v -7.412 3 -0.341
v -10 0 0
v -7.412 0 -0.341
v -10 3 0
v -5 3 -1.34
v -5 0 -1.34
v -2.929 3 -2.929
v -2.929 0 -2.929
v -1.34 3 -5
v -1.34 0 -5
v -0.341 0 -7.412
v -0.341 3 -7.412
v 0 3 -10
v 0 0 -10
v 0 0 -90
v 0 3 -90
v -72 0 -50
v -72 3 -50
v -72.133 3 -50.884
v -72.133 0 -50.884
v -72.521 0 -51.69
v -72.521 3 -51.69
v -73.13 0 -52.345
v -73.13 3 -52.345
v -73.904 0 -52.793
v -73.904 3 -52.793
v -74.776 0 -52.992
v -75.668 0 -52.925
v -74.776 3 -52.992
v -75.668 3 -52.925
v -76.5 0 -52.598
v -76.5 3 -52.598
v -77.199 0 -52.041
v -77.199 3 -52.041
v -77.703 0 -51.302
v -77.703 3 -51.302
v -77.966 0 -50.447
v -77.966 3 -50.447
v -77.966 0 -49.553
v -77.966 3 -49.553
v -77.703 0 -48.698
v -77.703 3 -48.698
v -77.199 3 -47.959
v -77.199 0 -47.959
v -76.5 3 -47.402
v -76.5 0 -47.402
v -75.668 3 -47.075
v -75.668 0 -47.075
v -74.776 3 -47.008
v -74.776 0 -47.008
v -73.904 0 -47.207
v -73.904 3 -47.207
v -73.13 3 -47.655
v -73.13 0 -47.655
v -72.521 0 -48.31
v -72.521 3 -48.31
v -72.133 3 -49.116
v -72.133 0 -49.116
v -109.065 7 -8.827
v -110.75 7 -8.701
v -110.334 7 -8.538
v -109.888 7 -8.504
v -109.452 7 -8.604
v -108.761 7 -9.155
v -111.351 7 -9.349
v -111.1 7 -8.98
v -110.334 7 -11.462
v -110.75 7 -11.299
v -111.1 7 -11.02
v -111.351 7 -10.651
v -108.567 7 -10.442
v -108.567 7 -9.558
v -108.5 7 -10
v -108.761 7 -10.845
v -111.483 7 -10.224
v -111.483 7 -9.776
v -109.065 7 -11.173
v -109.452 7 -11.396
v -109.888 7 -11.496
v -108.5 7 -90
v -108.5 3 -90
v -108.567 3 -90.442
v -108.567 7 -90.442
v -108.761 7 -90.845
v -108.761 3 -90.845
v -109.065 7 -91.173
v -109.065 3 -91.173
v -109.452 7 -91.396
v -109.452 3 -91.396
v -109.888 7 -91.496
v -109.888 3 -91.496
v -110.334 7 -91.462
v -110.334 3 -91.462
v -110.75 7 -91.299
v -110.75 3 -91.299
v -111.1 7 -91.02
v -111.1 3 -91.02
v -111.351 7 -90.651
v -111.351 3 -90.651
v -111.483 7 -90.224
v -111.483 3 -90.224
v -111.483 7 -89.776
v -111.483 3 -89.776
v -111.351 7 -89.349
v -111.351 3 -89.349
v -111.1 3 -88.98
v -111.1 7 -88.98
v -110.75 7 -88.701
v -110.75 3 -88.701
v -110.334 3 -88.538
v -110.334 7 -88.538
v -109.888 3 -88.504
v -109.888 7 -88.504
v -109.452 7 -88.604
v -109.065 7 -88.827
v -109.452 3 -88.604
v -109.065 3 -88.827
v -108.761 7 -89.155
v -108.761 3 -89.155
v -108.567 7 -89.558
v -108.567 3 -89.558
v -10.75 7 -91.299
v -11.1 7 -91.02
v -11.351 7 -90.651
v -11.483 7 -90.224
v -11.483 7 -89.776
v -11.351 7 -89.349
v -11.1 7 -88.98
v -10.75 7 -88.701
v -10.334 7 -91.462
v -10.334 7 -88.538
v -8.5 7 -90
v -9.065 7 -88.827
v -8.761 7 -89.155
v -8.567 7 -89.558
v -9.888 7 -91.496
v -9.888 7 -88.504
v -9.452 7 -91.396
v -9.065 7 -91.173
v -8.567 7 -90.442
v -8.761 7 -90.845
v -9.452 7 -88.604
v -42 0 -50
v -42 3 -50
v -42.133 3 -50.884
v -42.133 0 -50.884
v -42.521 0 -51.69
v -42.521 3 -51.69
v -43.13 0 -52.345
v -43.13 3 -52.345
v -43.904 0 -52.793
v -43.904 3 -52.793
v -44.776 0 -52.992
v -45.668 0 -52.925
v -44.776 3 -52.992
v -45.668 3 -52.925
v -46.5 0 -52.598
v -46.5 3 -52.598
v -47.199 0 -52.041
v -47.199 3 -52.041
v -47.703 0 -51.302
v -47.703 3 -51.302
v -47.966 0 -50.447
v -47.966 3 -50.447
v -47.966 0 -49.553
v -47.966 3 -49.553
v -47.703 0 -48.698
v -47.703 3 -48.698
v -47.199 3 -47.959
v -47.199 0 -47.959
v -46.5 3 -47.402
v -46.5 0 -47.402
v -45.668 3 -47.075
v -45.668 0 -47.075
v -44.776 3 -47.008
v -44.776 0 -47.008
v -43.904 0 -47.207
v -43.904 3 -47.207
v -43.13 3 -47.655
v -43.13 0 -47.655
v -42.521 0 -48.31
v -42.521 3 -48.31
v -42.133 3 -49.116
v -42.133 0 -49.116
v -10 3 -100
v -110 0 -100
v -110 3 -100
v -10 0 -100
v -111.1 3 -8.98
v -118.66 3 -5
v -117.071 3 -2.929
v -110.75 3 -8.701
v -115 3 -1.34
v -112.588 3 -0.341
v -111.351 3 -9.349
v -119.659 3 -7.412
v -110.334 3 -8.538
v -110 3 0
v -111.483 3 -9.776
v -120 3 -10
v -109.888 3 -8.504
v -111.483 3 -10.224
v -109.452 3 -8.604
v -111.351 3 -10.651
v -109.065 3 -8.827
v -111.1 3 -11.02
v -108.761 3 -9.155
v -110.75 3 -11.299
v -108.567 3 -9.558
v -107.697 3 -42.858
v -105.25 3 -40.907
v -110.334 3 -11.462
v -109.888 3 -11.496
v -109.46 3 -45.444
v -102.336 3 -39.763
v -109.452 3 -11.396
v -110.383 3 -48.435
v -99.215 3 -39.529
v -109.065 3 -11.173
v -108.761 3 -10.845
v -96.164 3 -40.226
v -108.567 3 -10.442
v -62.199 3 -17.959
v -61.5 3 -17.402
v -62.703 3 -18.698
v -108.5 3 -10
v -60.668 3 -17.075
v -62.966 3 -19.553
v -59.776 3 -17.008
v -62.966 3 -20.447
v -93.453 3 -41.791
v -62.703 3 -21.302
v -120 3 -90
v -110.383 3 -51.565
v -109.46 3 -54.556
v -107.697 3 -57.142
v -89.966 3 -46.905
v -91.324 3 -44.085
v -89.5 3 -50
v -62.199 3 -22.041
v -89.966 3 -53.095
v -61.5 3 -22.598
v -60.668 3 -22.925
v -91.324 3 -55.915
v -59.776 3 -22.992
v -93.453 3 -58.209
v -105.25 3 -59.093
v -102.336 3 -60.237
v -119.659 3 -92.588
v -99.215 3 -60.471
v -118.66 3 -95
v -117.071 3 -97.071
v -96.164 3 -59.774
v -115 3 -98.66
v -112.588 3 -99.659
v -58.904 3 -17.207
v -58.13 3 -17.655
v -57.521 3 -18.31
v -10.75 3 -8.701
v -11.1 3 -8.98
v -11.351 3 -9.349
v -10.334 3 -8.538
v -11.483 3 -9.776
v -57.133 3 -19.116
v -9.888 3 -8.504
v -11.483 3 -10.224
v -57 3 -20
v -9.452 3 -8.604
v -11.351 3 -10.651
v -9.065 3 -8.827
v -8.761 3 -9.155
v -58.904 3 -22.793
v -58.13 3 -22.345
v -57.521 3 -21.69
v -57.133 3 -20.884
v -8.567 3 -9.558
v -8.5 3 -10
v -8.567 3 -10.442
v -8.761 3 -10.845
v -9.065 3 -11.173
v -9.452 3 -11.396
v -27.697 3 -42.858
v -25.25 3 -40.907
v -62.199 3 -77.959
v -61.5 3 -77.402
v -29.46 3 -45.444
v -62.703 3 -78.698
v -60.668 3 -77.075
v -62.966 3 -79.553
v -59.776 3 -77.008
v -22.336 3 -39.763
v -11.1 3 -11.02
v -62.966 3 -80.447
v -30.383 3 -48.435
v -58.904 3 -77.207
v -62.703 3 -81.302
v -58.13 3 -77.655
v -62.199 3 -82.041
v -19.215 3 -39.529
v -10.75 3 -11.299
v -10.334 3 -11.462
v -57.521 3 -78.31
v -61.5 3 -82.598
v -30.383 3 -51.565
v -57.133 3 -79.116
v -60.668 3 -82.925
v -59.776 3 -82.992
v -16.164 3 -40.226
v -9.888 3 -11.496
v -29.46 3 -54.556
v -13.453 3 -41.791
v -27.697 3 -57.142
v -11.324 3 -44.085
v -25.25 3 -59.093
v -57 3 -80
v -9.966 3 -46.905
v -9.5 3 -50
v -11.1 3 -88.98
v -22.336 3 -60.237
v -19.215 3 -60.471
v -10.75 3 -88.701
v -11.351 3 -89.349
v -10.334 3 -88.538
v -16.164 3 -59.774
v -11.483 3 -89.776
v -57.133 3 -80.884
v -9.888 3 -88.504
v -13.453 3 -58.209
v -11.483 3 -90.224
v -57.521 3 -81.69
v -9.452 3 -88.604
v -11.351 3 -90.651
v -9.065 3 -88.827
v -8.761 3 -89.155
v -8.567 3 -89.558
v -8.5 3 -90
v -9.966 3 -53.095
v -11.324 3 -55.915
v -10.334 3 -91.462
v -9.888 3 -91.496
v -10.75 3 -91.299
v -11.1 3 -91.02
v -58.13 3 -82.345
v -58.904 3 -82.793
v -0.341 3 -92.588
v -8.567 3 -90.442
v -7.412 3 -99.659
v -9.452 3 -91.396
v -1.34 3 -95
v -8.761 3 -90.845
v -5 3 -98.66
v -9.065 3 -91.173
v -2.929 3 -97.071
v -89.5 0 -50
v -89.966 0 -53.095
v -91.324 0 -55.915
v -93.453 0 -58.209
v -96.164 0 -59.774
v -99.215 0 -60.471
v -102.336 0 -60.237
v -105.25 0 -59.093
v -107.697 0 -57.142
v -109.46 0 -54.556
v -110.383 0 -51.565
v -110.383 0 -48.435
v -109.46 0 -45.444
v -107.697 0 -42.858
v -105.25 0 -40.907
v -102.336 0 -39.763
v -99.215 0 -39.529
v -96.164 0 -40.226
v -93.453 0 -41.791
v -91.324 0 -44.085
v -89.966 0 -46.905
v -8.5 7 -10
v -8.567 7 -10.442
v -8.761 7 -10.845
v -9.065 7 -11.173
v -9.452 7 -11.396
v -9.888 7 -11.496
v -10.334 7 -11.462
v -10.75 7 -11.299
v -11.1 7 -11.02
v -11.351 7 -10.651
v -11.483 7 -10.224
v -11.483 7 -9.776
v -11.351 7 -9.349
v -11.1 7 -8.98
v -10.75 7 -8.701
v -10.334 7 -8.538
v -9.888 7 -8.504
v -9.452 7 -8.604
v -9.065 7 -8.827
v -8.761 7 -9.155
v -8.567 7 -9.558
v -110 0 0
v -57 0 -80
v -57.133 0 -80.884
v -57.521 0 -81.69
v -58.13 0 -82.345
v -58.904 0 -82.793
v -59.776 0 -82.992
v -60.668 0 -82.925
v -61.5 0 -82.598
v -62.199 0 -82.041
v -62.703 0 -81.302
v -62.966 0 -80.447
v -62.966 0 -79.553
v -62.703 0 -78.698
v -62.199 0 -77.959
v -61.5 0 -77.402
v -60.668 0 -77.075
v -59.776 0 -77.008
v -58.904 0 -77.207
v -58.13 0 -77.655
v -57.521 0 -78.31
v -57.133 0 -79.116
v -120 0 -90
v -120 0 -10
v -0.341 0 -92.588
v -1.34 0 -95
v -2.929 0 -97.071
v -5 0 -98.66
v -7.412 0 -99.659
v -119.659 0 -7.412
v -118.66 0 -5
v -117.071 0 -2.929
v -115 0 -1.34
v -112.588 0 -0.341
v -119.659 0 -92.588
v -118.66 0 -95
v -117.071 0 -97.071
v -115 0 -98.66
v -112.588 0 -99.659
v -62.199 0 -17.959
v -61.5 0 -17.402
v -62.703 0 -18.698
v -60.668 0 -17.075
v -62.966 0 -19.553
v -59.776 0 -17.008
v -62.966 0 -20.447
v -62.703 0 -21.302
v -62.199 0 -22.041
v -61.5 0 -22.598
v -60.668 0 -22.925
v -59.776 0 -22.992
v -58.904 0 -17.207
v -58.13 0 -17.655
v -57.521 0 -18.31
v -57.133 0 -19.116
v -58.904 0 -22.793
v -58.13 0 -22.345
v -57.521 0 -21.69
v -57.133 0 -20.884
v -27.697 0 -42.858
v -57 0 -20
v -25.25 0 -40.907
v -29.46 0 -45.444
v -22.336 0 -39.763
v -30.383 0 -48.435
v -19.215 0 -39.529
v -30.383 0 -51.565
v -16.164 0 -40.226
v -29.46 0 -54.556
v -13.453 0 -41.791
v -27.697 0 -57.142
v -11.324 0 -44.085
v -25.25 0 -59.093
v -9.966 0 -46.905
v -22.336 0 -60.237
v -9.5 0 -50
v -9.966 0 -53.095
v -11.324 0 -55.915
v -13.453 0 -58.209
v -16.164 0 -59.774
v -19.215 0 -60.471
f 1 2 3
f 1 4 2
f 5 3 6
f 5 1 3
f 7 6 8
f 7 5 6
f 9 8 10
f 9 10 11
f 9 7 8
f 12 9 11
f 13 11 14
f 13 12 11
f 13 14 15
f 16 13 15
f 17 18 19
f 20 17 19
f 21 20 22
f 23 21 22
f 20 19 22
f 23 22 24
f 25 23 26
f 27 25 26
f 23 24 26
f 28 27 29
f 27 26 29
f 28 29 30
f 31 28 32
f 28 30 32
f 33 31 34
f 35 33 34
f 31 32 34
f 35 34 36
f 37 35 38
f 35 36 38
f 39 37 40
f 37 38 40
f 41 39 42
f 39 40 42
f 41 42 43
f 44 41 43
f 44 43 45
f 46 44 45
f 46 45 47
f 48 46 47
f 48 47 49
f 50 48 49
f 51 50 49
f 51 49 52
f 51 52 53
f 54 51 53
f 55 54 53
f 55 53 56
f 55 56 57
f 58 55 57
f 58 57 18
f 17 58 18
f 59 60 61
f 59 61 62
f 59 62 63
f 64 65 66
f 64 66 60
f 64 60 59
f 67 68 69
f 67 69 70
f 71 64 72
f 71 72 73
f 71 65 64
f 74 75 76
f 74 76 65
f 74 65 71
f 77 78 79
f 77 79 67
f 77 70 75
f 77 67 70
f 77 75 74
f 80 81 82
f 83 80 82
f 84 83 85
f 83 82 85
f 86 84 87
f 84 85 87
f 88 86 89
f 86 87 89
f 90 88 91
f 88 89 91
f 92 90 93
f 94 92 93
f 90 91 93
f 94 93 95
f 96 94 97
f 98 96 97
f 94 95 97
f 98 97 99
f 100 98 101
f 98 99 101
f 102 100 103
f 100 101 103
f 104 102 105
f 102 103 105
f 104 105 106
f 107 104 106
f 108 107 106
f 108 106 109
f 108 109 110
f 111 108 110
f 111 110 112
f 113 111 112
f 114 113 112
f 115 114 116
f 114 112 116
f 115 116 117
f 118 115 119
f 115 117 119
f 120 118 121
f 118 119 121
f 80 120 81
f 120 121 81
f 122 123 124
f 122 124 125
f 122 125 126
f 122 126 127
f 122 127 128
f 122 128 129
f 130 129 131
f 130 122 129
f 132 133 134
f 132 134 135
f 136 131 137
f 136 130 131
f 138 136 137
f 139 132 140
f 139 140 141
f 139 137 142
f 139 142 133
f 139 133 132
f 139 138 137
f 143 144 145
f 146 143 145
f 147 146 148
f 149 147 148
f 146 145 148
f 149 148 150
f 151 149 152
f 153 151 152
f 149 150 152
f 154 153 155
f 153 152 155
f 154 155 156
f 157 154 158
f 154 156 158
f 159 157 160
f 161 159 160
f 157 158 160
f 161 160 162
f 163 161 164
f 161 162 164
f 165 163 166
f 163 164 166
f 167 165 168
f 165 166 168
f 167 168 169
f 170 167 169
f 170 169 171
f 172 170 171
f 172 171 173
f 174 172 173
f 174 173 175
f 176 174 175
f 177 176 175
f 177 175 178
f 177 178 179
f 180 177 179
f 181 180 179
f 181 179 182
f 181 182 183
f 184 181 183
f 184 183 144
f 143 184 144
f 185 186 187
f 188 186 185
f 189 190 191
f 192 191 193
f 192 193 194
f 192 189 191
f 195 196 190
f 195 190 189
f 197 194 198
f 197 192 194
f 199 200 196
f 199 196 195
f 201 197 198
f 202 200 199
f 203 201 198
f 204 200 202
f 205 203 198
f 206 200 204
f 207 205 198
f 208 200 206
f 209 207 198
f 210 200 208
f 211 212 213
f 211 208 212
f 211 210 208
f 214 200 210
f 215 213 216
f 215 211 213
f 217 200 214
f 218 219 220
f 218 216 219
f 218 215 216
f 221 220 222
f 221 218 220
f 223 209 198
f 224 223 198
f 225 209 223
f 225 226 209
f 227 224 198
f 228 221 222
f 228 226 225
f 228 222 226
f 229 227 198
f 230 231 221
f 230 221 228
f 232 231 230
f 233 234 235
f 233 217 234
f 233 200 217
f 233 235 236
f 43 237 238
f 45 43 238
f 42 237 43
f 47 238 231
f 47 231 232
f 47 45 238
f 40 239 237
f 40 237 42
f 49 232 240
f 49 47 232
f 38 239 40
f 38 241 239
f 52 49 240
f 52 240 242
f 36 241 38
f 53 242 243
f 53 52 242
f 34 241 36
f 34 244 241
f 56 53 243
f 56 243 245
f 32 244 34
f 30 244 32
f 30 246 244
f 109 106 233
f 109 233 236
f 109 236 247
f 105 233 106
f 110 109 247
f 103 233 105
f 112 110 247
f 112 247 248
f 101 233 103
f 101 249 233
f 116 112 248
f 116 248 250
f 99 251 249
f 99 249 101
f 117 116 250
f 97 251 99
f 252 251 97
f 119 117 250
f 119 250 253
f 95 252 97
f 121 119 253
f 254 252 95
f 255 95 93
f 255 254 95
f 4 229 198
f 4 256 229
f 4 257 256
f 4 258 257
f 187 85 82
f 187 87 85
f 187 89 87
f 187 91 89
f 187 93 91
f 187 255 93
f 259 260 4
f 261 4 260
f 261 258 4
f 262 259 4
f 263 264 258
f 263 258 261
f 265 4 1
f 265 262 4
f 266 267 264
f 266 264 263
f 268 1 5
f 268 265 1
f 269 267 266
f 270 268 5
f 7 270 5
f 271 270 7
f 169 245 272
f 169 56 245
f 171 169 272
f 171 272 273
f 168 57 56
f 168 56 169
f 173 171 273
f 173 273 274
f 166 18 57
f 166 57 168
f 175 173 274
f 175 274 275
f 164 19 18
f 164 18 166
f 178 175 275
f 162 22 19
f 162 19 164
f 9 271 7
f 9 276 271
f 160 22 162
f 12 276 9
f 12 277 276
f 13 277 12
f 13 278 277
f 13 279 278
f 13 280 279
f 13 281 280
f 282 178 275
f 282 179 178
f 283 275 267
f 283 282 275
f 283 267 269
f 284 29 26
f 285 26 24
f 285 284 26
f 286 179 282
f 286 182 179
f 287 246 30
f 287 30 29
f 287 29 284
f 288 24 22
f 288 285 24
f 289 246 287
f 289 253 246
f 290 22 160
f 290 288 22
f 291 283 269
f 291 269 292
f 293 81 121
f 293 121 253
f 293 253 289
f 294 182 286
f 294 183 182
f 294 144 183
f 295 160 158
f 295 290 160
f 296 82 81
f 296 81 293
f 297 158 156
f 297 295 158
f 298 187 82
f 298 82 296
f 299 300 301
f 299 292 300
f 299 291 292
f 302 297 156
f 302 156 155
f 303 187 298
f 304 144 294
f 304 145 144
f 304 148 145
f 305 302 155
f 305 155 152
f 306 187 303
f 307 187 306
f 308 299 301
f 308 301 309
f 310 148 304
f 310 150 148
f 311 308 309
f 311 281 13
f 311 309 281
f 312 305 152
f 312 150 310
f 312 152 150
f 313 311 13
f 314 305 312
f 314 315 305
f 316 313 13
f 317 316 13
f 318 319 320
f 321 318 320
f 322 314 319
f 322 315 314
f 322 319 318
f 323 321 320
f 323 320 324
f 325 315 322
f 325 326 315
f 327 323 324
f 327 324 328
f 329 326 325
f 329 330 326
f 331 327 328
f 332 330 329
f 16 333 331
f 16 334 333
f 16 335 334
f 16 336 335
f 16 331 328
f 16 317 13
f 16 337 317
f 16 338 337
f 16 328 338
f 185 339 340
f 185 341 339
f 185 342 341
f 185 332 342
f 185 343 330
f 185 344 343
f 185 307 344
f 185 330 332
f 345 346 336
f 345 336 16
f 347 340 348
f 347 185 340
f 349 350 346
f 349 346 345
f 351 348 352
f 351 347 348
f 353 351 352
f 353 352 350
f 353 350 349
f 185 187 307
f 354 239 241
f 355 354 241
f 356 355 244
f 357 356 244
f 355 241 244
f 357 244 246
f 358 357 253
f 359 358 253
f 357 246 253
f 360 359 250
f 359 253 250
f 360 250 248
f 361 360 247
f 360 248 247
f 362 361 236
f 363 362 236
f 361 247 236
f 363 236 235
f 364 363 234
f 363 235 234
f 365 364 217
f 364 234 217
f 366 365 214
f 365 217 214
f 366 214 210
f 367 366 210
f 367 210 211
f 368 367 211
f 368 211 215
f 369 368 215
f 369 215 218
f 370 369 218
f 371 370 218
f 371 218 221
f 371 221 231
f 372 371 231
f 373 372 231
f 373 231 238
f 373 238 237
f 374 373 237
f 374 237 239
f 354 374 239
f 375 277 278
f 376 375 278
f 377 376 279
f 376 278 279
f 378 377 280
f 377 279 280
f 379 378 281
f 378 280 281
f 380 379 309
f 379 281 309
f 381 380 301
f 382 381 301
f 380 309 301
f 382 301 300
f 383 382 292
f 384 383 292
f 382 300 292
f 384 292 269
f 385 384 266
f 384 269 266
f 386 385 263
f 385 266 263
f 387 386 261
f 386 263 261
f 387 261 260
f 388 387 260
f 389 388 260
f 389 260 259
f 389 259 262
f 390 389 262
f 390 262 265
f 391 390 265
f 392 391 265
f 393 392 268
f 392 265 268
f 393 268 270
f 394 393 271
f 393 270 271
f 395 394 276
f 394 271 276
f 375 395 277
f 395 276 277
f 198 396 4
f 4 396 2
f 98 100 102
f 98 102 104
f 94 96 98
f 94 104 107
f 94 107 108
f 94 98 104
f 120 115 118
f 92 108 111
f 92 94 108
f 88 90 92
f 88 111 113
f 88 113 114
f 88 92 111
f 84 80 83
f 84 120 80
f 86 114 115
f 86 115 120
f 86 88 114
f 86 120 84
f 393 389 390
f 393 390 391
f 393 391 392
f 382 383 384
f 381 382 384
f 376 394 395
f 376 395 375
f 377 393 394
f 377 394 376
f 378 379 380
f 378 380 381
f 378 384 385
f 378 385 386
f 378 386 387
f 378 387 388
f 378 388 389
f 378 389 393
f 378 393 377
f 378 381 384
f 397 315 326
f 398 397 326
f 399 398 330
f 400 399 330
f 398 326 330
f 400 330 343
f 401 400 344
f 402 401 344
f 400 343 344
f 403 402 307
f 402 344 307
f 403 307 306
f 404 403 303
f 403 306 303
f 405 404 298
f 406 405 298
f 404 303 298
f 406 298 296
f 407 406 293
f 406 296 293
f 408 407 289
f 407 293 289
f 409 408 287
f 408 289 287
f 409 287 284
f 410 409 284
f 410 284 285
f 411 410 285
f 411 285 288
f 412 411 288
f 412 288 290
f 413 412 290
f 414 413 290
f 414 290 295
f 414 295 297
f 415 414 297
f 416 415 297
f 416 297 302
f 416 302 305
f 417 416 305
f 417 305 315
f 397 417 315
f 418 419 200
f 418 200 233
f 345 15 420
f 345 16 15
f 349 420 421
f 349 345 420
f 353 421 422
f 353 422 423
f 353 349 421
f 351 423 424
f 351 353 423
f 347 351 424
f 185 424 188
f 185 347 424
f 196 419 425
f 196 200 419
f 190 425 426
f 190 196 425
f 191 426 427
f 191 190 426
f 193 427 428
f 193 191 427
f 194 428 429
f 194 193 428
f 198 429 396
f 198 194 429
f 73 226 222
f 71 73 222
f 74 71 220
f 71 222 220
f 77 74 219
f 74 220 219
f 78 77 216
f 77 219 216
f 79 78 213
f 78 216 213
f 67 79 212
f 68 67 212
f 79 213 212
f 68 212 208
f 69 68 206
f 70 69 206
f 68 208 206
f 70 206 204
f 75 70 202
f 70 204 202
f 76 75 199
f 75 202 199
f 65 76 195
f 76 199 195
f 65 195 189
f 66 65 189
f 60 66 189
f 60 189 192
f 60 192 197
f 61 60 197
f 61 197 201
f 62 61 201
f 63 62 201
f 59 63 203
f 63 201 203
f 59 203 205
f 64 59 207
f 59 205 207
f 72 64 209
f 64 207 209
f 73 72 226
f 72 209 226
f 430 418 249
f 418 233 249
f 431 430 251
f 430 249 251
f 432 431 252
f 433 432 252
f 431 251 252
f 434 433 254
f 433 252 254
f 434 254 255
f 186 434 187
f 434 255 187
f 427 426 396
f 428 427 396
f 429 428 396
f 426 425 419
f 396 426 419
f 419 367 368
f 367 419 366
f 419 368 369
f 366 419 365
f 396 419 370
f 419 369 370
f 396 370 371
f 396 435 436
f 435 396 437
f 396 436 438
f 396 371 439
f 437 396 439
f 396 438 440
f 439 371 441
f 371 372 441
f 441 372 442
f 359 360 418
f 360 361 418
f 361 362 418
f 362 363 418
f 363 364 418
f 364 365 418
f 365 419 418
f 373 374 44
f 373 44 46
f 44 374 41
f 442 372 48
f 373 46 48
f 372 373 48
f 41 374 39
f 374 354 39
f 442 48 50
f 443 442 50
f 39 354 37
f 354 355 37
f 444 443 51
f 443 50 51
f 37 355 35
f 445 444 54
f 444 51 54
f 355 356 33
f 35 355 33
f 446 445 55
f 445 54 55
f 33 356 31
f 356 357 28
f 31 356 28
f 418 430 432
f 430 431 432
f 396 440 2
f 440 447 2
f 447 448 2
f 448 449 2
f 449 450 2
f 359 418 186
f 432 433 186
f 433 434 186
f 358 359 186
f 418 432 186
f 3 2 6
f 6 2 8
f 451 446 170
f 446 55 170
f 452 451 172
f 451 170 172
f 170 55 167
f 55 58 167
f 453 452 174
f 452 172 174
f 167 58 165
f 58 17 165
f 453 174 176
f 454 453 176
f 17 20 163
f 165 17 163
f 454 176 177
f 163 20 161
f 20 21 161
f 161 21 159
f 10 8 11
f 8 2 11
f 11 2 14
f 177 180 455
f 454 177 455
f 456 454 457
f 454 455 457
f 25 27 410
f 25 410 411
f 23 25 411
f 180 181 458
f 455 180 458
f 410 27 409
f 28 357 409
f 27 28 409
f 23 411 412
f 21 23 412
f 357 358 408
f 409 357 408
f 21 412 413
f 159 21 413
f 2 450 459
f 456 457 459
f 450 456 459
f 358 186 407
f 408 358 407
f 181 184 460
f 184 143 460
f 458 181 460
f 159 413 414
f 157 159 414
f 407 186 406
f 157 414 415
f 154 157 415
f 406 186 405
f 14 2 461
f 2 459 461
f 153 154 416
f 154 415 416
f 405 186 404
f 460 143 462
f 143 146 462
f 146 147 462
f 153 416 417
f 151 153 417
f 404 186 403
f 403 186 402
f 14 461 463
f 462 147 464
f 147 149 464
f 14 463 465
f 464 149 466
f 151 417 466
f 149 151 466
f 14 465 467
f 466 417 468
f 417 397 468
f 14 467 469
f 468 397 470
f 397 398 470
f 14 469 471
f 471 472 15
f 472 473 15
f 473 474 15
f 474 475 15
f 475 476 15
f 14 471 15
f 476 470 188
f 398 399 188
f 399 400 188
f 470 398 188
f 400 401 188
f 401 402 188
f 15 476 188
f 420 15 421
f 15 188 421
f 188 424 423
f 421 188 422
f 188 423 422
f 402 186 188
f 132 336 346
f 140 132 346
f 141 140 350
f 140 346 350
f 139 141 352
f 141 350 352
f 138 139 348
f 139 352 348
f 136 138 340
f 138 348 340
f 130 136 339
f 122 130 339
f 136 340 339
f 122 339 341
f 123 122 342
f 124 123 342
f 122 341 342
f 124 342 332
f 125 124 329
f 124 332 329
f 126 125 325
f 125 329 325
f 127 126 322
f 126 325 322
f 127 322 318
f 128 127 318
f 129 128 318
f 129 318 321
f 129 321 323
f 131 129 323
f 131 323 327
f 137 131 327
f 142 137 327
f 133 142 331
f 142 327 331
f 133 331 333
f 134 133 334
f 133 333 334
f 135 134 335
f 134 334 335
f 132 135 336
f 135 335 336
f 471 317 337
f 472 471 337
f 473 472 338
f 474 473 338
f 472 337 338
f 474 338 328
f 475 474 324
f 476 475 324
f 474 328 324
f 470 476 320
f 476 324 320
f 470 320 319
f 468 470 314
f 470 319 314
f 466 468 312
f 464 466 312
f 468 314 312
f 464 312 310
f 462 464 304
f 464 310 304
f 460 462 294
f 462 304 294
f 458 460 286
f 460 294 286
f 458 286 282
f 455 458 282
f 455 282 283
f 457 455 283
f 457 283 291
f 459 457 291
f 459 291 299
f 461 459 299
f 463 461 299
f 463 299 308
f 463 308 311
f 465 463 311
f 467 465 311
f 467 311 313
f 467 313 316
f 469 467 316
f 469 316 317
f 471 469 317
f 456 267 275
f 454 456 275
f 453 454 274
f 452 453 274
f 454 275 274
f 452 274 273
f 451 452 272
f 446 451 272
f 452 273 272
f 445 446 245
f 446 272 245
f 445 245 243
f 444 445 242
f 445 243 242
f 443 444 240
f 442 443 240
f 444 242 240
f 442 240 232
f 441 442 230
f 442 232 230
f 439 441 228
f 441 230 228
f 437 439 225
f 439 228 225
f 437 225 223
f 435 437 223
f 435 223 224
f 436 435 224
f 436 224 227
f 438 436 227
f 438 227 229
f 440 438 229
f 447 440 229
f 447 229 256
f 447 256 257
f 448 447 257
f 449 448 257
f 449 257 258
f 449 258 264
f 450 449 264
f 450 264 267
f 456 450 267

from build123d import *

# Parameters (mm, degrees)
ESQUISSE1_W             = 120
ESQUISSE1_H             = 100
BOSS_EXTRU_1_DEPTH      = 3
CONG_1_R                = 10
ESQUISSE2_R             = 1.5
BOSS_EXTRU_2_DEPTH      = 4
ESQUISSE3_R             = 10.5
ESQUISSE3_R_2           = 3
ENL_V_MAT_EXTRU_1_DEPTH = 4


with BuildPart() as part:
    # Esquisse1 → Boss.-Extru.1 (new body)
    with BuildSketch(Plane(origin=(0, 0, 0), x_dir=(1, 0, 0), z_dir=(0, 1, 0))):
        with Locations((-60, 50)):
            Rectangle(ESQUISSE1_W, ESQUISSE1_H)
    extrude(amount=BOSS_EXTRU_1_DEPTH)

    # Congé1
    cong_1_edges = [part.edges().sort_by_distance(p)[0] for p in [
        (0, 1.5, 0),
        (-120, 1.5, 0),
        (-120, 1.5, -100),
        (0, 1.5, -100),
    ]]
    fillet(cong_1_edges, radius=CONG_1_R)

    # Esquisse2 → Boss.-Extru.2 (add)
    with BuildSketch(Plane(origin=(0, 3, 0), x_dir=(1, 0, 0), z_dir=(0, 1, 0))):
        with Locations((-110, 90)):
            Circle(ESQUISSE2_R)
        with Locations((-10, 90)):
            Circle(ESQUISSE2_R)
        with Locations((-10, 10)):
            Circle(ESQUISSE2_R)
        with Locations((-110, 10)):
            Circle(ESQUISSE2_R)
    extrude(amount=BOSS_EXTRU_2_DEPTH)

    # Esquisse3 → Enlèv. mat.-Extru.1 (cut, through all)
    with BuildSketch(Plane(origin=(0, 3, 0), x_dir=(1, 0, 0), z_dir=(0, 1, 0))):
        with Locations((-100, 50)):
            Circle(ESQUISSE3_R)
        with Locations((-20, 50)):
            Circle(ESQUISSE3_R)
        with Locations((-75, 50)):
            Circle(ESQUISSE3_R_2)
        with Locations((-45, 50)):
            Circle(ESQUISSE3_R_2)
        with Locations((-60, 80)):
            Circle(ESQUISSE3_R_2)
        with Locations((-60, 20)):
            Circle(ESQUISSE3_R_2)
    extrude(amount=-ENL_V_MAT_EXTRU_1_DEPTH, mode=Mode.SUBTRACT)


solid = part.part
